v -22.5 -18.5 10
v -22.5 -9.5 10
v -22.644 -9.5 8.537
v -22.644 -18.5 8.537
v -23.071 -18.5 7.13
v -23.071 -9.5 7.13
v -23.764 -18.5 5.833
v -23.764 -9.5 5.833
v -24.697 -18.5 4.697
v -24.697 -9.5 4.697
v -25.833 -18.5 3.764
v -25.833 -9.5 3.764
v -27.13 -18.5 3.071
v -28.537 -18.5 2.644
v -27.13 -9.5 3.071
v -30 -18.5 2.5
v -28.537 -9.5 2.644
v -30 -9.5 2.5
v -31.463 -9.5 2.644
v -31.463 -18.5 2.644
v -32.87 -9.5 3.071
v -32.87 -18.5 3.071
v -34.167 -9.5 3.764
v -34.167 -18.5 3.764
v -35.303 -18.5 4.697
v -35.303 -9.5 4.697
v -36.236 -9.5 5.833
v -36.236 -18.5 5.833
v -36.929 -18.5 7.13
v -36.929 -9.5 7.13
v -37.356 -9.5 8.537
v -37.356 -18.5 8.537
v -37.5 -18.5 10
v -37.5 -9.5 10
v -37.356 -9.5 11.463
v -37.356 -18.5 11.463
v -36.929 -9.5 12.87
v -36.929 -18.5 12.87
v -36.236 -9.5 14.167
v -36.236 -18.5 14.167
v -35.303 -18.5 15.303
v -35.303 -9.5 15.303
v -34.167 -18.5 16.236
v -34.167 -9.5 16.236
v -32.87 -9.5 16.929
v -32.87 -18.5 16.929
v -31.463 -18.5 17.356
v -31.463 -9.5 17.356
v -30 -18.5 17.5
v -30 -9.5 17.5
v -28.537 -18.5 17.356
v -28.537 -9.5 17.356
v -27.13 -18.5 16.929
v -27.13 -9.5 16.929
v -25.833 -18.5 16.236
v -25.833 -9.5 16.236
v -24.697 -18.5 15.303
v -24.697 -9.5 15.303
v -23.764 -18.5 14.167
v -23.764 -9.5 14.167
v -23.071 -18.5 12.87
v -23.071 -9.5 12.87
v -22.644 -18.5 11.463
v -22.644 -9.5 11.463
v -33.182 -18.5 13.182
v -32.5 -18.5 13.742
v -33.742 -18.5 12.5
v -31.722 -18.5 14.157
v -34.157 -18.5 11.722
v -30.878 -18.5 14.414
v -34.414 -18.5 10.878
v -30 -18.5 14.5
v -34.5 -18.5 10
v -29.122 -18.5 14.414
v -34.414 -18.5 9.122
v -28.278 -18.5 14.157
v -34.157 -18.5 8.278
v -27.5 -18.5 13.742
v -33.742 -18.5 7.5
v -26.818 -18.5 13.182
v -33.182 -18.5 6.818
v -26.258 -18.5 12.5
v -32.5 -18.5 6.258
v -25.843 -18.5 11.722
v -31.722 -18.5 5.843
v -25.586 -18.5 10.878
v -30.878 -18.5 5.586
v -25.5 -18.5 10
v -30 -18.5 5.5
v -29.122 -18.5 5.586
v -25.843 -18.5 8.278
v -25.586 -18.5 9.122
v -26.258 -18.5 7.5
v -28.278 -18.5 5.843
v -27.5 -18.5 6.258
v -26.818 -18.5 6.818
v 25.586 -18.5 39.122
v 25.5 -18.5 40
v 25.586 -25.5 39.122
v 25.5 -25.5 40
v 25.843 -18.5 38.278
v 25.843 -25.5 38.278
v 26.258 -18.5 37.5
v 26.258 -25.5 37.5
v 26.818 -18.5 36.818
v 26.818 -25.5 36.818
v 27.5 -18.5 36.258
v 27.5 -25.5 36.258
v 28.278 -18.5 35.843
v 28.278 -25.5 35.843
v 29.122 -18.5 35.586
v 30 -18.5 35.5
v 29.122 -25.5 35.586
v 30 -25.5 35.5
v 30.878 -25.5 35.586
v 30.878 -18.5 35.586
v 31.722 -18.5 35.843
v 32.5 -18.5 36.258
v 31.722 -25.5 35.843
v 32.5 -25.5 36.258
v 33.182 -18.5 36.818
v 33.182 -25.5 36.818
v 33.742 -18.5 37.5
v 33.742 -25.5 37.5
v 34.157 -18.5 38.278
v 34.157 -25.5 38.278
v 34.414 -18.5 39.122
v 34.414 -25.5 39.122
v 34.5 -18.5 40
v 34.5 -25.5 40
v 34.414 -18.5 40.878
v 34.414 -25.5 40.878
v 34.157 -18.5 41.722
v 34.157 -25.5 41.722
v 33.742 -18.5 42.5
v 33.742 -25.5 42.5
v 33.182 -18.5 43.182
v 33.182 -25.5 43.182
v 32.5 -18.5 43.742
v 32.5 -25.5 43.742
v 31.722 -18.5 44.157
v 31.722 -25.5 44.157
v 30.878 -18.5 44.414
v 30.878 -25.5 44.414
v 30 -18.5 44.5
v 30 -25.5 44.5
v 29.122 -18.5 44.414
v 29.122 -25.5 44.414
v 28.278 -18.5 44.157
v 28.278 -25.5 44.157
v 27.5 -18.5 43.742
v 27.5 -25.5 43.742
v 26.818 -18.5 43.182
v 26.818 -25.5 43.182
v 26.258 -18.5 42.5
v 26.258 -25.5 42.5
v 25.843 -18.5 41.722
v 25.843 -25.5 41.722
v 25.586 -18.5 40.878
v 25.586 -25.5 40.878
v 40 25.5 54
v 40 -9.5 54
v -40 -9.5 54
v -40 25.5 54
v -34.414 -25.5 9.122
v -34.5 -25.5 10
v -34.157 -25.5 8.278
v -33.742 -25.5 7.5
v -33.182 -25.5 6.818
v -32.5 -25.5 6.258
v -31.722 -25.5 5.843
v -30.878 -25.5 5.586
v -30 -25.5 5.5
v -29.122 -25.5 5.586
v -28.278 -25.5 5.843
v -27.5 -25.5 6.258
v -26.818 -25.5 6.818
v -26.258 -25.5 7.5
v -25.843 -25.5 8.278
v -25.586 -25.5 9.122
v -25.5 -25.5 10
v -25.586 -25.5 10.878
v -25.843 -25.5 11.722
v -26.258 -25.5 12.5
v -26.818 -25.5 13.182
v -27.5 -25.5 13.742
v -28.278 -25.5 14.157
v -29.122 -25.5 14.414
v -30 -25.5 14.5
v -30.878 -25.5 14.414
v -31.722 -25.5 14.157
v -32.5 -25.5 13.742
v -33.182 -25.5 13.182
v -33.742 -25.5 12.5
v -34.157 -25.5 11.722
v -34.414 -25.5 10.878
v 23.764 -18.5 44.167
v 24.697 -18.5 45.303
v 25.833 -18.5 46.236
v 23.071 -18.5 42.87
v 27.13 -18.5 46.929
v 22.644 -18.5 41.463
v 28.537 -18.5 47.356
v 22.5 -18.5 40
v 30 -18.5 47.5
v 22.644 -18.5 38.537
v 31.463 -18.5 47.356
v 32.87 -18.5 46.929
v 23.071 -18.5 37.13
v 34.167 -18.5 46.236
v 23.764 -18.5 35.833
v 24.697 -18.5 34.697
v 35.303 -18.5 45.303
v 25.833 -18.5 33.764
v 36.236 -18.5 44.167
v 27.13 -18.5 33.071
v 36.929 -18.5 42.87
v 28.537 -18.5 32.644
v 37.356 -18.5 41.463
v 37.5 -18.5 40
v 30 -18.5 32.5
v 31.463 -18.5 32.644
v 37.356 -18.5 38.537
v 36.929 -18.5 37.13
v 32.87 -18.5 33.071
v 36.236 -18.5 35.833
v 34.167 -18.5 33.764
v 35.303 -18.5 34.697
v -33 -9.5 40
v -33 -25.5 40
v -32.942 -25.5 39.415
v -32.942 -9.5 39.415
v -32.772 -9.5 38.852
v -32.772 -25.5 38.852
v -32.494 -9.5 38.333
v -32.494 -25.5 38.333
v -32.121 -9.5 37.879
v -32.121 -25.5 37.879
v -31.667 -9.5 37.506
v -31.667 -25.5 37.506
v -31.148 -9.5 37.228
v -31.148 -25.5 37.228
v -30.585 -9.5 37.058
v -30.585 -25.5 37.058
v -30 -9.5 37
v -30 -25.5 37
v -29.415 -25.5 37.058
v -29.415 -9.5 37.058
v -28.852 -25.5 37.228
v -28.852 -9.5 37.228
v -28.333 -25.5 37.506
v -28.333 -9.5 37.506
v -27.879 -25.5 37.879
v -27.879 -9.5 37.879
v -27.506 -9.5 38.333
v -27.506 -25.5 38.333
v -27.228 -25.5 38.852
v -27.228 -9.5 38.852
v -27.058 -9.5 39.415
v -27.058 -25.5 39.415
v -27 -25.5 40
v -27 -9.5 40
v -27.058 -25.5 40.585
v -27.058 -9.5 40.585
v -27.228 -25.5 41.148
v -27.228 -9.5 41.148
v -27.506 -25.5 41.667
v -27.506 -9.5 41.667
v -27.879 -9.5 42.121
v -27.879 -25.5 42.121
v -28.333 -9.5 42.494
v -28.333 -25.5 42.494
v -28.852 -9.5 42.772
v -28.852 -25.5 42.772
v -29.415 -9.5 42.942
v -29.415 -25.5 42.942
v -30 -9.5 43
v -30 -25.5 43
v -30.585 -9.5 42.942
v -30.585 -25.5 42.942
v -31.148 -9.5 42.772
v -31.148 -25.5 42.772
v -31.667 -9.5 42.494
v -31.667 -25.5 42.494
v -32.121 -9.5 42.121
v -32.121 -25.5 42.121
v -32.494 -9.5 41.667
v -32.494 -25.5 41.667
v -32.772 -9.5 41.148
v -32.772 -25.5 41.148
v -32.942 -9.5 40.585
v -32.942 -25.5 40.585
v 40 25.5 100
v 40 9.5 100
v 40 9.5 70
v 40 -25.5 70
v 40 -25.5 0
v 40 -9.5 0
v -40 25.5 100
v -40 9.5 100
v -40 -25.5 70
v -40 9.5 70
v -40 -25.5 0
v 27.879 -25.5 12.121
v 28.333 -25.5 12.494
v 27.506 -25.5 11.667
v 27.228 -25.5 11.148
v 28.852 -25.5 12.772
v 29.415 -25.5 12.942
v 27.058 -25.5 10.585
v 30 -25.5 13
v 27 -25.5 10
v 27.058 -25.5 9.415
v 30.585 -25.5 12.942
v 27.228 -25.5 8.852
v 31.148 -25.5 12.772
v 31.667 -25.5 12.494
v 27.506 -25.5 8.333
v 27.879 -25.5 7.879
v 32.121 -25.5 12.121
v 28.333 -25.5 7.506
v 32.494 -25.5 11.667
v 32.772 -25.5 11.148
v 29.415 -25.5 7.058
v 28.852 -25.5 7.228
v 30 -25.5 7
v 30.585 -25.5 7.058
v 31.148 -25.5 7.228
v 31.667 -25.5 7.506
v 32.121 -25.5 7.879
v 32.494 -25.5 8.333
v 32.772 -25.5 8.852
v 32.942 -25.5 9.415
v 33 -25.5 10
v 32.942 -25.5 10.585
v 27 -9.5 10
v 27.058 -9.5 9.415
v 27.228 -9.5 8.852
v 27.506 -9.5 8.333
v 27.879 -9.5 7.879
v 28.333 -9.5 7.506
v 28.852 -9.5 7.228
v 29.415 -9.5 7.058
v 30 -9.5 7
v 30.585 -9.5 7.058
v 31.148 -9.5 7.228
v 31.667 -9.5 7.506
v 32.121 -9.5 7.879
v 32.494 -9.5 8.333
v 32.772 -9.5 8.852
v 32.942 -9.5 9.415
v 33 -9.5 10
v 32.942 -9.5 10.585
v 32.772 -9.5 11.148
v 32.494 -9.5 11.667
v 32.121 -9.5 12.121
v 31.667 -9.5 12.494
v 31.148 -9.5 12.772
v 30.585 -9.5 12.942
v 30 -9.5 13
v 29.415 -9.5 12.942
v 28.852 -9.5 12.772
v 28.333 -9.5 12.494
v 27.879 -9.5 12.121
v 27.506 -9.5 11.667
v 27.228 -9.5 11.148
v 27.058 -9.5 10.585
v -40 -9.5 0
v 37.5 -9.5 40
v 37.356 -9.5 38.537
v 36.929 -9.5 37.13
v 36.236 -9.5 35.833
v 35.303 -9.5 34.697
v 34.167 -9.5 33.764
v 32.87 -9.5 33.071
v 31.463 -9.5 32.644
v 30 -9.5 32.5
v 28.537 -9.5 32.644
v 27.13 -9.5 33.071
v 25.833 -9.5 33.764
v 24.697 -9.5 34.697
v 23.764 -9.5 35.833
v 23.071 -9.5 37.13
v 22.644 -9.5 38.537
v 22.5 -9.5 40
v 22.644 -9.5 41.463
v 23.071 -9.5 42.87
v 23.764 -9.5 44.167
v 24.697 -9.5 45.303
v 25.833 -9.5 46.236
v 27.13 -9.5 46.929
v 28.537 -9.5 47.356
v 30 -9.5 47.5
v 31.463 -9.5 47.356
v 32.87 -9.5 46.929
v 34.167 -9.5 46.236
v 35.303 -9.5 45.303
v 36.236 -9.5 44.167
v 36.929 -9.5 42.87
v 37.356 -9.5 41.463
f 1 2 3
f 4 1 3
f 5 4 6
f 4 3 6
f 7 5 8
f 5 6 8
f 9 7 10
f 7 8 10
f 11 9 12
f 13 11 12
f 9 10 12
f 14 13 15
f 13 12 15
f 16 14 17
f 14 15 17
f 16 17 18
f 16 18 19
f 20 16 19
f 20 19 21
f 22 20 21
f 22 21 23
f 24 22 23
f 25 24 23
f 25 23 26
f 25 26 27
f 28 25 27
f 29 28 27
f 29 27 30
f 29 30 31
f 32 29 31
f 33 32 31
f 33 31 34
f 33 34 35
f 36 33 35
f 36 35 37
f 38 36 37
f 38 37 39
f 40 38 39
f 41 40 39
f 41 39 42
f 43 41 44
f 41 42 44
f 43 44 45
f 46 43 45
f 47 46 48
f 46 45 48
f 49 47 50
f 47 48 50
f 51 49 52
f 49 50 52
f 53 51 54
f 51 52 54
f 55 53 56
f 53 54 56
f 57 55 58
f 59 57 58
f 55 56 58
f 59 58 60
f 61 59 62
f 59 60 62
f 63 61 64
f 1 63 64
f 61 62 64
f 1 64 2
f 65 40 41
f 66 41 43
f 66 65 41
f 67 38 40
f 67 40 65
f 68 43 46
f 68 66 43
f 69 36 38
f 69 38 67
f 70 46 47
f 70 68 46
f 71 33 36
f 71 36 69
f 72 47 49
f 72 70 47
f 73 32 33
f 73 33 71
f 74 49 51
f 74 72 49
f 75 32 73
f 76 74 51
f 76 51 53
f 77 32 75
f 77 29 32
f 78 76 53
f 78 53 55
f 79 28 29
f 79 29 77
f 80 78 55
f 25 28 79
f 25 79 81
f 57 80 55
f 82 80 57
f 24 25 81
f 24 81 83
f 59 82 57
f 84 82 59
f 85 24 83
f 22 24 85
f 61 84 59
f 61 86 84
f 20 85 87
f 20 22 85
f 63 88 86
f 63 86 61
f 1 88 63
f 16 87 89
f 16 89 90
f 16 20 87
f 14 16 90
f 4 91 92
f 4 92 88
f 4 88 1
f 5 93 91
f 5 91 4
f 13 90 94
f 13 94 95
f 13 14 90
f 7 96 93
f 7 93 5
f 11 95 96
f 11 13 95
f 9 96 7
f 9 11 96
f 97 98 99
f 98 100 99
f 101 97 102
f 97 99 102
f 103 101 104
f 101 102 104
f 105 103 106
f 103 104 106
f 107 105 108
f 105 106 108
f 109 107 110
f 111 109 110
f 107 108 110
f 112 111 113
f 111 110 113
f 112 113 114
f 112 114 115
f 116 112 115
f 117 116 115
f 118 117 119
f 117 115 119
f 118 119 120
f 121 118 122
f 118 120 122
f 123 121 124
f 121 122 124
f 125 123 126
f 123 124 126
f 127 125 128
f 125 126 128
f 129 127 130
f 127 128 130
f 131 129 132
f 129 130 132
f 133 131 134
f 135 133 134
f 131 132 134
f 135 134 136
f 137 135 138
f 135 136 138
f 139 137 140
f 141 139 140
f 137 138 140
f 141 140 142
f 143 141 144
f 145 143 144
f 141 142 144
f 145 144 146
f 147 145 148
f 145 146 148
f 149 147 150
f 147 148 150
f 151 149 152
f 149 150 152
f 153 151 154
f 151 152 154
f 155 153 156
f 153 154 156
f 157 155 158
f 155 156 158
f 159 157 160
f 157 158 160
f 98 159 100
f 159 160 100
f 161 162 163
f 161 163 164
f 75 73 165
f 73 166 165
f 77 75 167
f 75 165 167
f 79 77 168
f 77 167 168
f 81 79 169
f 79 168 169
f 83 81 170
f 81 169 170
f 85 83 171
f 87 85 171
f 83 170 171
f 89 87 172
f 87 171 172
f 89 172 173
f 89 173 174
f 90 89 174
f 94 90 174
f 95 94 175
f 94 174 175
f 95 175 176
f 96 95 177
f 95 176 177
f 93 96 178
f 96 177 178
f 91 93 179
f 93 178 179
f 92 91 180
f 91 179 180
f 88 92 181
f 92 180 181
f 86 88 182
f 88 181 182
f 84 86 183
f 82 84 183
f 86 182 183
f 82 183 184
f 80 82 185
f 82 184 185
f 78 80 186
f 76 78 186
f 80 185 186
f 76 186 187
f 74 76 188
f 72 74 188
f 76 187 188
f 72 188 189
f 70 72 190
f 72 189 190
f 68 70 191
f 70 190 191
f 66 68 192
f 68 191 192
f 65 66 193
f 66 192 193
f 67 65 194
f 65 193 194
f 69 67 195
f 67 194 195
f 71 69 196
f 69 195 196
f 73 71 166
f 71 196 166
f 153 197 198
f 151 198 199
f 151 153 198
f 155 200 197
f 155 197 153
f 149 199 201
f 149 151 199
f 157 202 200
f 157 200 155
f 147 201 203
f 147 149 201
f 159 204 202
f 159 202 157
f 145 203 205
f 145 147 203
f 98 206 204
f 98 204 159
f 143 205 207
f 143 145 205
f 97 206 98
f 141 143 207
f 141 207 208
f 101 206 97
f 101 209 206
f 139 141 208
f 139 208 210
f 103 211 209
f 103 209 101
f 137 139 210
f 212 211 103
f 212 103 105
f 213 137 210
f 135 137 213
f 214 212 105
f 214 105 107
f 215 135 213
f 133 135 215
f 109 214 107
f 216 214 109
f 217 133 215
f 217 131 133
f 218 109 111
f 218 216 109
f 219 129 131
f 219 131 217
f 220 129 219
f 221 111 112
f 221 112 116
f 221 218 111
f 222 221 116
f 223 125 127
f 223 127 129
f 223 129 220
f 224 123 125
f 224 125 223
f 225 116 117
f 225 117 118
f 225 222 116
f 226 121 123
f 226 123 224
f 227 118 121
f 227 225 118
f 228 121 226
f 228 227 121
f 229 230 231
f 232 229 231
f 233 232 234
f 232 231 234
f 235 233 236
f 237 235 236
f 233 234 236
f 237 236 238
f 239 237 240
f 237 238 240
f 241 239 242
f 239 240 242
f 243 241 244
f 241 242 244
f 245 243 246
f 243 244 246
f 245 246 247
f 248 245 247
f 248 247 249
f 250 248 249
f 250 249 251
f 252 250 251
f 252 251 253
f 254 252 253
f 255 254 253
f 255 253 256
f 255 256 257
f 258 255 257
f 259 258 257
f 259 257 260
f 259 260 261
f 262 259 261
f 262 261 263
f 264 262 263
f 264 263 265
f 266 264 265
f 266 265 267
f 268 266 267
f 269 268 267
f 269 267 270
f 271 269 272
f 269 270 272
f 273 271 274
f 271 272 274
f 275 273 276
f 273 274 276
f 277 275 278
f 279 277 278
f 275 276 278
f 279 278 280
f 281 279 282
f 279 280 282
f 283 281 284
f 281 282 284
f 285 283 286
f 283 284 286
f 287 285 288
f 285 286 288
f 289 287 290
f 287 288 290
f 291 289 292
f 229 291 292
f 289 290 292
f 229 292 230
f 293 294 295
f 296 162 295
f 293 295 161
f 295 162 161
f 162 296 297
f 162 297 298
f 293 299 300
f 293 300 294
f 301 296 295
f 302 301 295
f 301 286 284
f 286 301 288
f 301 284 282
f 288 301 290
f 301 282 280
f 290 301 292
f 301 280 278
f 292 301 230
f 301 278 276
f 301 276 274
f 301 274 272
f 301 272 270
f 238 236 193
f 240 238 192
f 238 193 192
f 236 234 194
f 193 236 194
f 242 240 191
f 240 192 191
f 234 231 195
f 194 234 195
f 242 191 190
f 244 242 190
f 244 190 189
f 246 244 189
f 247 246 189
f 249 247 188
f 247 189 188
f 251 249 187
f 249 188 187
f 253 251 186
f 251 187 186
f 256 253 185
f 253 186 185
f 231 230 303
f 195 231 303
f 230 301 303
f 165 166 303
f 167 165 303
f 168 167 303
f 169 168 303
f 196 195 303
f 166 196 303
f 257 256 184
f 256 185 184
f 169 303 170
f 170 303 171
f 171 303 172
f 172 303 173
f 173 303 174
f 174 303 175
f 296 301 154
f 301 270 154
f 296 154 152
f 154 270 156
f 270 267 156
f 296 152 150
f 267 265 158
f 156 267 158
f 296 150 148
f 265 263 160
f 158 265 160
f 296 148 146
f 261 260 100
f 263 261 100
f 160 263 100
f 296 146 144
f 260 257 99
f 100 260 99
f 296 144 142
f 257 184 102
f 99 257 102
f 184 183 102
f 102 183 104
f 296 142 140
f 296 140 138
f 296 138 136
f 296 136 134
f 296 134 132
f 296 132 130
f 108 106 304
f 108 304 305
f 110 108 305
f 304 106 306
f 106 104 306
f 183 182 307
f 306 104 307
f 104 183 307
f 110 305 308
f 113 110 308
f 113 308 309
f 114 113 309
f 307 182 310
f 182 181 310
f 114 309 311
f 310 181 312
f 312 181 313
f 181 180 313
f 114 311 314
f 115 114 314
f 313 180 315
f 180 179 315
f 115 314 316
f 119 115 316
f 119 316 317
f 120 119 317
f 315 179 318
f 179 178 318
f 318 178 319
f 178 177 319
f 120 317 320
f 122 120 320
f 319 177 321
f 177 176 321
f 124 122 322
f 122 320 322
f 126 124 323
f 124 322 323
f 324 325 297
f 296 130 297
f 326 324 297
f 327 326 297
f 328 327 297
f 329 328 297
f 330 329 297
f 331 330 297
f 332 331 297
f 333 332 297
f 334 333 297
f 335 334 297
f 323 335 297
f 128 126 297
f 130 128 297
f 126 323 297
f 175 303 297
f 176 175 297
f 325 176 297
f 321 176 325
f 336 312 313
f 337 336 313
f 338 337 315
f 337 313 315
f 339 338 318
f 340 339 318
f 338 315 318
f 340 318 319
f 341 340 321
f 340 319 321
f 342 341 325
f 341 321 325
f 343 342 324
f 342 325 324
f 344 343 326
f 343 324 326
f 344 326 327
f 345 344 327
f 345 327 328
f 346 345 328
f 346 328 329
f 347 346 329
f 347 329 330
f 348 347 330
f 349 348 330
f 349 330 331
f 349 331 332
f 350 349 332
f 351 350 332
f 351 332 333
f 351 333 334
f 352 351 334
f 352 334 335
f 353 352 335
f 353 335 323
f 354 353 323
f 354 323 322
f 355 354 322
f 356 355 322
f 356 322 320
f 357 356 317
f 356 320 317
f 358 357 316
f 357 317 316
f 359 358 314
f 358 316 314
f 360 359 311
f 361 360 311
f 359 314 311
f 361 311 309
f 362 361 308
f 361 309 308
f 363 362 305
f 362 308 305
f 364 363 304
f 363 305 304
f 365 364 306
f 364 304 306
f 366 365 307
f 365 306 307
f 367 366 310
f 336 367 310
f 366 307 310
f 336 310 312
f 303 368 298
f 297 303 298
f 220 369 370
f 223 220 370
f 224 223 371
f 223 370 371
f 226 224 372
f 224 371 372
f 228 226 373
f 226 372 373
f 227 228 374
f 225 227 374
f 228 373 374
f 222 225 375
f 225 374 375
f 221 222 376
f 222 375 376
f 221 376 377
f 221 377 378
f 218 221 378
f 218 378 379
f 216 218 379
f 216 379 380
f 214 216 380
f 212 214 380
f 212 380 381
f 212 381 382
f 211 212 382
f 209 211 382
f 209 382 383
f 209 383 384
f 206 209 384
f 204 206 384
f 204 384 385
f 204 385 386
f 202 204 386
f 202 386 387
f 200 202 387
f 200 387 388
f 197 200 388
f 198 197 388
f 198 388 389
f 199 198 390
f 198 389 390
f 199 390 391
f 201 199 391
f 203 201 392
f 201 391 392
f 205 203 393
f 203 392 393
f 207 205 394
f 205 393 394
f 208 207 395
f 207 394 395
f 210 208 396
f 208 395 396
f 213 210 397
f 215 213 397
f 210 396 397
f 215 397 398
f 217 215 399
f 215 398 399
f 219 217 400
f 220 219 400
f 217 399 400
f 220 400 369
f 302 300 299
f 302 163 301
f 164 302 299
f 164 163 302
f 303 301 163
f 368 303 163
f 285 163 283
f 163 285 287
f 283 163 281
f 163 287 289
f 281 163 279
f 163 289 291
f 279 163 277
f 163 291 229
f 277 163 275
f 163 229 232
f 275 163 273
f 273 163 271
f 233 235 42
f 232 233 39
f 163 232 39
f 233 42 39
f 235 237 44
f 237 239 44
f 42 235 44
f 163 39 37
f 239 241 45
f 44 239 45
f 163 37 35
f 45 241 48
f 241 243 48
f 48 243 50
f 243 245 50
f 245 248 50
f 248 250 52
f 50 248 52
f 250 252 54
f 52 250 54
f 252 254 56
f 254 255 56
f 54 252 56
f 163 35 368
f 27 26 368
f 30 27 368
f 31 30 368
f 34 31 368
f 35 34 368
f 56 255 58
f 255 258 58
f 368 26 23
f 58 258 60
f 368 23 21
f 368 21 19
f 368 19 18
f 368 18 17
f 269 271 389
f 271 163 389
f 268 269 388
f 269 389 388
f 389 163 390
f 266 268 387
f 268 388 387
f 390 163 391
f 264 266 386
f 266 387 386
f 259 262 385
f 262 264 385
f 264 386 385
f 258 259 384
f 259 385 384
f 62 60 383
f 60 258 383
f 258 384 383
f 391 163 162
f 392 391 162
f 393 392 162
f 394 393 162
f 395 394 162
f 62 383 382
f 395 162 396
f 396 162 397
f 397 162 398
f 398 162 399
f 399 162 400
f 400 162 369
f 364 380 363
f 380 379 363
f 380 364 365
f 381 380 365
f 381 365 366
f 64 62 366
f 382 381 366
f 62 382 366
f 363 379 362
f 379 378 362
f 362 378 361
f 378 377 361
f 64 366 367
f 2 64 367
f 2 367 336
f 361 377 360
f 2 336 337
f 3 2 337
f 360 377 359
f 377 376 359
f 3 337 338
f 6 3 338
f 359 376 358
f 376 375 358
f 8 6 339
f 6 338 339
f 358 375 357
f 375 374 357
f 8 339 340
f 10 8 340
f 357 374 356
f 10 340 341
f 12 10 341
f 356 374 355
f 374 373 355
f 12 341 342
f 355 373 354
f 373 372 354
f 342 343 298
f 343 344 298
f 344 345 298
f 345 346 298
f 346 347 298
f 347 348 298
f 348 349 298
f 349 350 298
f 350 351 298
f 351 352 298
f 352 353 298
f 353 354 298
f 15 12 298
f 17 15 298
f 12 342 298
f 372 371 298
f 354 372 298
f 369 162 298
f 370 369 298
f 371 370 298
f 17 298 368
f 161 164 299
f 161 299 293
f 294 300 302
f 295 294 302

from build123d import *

# Parameters (mm, degrees)
SKETCH_1_W                = 80
SKETCH_1_H                = 51
EXTRUDE_1_DEPTH           = 100
SKETCH_2_W                = 30
SKETCH_2_H                = 35
CUT_EXTRUDE_1_DEPTH       = 131.576605868
SKETCH_3_W                = 54
SKETCH_3_H                = 35
CUT_EXTRUDE_2_DEPTH       = 131.576605868
HOLE_WIZARD_1_D           = 9
HOLE_WIZARD_1_CBORE_D     = 15
HOLE_WIZARD_1_CBORE_DEPTH = 9
MM_1_D                    = 6


with BuildPart() as part:
    # 草图1 → 凸台-拉伸1 (new body)
    with BuildSketch(Plane.XY):
        Rectangle(SKETCH_1_W, SKETCH_1_H)
    extrude(amount=EXTRUDE_1_DEPTH)

    # 草图2 → 切除-拉伸1 (cut, through all)
    with BuildSketch(Plane(origin=(40, 0, 0), x_dir=(0, 0, -1), z_dir=(1, 0, 0))):
        with Locations((-85, -8)):
            Rectangle(SKETCH_2_W, SKETCH_2_H)
    extrude(amount=-CUT_EXTRUDE_1_DEPTH, mode=Mode.SUBTRACT)

    # 草图3 → 切除-拉伸2 (cut, through all)
    with BuildSketch(Plane(origin=(40, 0, 0), x_dir=(0, 0, -1), z_dir=(1, 0, 0))):
        with Locations((-27, 8)):
            Rectangle(SKETCH_3_W, SKETCH_3_H)
    extrude(amount=-CUT_EXTRUDE_2_DEPTH, mode=Mode.SUBTRACT)

    # 打孔尺寸(%根据)内六角圆柱头螺钉的类型1 (through all)
    with Locations(Plane(origin=(0, -9.5, 0), x_dir=(1, 0, 0), z_dir=(0, 1, 0))):
        with Locations((-30, -10), (30, -40)):
            CounterBoreHole(HOLE_WIZARD_1_D / 2, HOLE_WIZARD_1_CBORE_D / 2, HOLE_WIZARD_1_CBORE_DEPTH)

    # 大小mm 暗销孔1 (through all)
    with Locations(Plane(origin=(0, -9.5, 0), x_dir=(1, 0, 0), z_dir=(0, 1, 0))):
        with Locations((-30, -40), (30, -10)):
            Hole(MM_1_D / 2)


solid = part.part
